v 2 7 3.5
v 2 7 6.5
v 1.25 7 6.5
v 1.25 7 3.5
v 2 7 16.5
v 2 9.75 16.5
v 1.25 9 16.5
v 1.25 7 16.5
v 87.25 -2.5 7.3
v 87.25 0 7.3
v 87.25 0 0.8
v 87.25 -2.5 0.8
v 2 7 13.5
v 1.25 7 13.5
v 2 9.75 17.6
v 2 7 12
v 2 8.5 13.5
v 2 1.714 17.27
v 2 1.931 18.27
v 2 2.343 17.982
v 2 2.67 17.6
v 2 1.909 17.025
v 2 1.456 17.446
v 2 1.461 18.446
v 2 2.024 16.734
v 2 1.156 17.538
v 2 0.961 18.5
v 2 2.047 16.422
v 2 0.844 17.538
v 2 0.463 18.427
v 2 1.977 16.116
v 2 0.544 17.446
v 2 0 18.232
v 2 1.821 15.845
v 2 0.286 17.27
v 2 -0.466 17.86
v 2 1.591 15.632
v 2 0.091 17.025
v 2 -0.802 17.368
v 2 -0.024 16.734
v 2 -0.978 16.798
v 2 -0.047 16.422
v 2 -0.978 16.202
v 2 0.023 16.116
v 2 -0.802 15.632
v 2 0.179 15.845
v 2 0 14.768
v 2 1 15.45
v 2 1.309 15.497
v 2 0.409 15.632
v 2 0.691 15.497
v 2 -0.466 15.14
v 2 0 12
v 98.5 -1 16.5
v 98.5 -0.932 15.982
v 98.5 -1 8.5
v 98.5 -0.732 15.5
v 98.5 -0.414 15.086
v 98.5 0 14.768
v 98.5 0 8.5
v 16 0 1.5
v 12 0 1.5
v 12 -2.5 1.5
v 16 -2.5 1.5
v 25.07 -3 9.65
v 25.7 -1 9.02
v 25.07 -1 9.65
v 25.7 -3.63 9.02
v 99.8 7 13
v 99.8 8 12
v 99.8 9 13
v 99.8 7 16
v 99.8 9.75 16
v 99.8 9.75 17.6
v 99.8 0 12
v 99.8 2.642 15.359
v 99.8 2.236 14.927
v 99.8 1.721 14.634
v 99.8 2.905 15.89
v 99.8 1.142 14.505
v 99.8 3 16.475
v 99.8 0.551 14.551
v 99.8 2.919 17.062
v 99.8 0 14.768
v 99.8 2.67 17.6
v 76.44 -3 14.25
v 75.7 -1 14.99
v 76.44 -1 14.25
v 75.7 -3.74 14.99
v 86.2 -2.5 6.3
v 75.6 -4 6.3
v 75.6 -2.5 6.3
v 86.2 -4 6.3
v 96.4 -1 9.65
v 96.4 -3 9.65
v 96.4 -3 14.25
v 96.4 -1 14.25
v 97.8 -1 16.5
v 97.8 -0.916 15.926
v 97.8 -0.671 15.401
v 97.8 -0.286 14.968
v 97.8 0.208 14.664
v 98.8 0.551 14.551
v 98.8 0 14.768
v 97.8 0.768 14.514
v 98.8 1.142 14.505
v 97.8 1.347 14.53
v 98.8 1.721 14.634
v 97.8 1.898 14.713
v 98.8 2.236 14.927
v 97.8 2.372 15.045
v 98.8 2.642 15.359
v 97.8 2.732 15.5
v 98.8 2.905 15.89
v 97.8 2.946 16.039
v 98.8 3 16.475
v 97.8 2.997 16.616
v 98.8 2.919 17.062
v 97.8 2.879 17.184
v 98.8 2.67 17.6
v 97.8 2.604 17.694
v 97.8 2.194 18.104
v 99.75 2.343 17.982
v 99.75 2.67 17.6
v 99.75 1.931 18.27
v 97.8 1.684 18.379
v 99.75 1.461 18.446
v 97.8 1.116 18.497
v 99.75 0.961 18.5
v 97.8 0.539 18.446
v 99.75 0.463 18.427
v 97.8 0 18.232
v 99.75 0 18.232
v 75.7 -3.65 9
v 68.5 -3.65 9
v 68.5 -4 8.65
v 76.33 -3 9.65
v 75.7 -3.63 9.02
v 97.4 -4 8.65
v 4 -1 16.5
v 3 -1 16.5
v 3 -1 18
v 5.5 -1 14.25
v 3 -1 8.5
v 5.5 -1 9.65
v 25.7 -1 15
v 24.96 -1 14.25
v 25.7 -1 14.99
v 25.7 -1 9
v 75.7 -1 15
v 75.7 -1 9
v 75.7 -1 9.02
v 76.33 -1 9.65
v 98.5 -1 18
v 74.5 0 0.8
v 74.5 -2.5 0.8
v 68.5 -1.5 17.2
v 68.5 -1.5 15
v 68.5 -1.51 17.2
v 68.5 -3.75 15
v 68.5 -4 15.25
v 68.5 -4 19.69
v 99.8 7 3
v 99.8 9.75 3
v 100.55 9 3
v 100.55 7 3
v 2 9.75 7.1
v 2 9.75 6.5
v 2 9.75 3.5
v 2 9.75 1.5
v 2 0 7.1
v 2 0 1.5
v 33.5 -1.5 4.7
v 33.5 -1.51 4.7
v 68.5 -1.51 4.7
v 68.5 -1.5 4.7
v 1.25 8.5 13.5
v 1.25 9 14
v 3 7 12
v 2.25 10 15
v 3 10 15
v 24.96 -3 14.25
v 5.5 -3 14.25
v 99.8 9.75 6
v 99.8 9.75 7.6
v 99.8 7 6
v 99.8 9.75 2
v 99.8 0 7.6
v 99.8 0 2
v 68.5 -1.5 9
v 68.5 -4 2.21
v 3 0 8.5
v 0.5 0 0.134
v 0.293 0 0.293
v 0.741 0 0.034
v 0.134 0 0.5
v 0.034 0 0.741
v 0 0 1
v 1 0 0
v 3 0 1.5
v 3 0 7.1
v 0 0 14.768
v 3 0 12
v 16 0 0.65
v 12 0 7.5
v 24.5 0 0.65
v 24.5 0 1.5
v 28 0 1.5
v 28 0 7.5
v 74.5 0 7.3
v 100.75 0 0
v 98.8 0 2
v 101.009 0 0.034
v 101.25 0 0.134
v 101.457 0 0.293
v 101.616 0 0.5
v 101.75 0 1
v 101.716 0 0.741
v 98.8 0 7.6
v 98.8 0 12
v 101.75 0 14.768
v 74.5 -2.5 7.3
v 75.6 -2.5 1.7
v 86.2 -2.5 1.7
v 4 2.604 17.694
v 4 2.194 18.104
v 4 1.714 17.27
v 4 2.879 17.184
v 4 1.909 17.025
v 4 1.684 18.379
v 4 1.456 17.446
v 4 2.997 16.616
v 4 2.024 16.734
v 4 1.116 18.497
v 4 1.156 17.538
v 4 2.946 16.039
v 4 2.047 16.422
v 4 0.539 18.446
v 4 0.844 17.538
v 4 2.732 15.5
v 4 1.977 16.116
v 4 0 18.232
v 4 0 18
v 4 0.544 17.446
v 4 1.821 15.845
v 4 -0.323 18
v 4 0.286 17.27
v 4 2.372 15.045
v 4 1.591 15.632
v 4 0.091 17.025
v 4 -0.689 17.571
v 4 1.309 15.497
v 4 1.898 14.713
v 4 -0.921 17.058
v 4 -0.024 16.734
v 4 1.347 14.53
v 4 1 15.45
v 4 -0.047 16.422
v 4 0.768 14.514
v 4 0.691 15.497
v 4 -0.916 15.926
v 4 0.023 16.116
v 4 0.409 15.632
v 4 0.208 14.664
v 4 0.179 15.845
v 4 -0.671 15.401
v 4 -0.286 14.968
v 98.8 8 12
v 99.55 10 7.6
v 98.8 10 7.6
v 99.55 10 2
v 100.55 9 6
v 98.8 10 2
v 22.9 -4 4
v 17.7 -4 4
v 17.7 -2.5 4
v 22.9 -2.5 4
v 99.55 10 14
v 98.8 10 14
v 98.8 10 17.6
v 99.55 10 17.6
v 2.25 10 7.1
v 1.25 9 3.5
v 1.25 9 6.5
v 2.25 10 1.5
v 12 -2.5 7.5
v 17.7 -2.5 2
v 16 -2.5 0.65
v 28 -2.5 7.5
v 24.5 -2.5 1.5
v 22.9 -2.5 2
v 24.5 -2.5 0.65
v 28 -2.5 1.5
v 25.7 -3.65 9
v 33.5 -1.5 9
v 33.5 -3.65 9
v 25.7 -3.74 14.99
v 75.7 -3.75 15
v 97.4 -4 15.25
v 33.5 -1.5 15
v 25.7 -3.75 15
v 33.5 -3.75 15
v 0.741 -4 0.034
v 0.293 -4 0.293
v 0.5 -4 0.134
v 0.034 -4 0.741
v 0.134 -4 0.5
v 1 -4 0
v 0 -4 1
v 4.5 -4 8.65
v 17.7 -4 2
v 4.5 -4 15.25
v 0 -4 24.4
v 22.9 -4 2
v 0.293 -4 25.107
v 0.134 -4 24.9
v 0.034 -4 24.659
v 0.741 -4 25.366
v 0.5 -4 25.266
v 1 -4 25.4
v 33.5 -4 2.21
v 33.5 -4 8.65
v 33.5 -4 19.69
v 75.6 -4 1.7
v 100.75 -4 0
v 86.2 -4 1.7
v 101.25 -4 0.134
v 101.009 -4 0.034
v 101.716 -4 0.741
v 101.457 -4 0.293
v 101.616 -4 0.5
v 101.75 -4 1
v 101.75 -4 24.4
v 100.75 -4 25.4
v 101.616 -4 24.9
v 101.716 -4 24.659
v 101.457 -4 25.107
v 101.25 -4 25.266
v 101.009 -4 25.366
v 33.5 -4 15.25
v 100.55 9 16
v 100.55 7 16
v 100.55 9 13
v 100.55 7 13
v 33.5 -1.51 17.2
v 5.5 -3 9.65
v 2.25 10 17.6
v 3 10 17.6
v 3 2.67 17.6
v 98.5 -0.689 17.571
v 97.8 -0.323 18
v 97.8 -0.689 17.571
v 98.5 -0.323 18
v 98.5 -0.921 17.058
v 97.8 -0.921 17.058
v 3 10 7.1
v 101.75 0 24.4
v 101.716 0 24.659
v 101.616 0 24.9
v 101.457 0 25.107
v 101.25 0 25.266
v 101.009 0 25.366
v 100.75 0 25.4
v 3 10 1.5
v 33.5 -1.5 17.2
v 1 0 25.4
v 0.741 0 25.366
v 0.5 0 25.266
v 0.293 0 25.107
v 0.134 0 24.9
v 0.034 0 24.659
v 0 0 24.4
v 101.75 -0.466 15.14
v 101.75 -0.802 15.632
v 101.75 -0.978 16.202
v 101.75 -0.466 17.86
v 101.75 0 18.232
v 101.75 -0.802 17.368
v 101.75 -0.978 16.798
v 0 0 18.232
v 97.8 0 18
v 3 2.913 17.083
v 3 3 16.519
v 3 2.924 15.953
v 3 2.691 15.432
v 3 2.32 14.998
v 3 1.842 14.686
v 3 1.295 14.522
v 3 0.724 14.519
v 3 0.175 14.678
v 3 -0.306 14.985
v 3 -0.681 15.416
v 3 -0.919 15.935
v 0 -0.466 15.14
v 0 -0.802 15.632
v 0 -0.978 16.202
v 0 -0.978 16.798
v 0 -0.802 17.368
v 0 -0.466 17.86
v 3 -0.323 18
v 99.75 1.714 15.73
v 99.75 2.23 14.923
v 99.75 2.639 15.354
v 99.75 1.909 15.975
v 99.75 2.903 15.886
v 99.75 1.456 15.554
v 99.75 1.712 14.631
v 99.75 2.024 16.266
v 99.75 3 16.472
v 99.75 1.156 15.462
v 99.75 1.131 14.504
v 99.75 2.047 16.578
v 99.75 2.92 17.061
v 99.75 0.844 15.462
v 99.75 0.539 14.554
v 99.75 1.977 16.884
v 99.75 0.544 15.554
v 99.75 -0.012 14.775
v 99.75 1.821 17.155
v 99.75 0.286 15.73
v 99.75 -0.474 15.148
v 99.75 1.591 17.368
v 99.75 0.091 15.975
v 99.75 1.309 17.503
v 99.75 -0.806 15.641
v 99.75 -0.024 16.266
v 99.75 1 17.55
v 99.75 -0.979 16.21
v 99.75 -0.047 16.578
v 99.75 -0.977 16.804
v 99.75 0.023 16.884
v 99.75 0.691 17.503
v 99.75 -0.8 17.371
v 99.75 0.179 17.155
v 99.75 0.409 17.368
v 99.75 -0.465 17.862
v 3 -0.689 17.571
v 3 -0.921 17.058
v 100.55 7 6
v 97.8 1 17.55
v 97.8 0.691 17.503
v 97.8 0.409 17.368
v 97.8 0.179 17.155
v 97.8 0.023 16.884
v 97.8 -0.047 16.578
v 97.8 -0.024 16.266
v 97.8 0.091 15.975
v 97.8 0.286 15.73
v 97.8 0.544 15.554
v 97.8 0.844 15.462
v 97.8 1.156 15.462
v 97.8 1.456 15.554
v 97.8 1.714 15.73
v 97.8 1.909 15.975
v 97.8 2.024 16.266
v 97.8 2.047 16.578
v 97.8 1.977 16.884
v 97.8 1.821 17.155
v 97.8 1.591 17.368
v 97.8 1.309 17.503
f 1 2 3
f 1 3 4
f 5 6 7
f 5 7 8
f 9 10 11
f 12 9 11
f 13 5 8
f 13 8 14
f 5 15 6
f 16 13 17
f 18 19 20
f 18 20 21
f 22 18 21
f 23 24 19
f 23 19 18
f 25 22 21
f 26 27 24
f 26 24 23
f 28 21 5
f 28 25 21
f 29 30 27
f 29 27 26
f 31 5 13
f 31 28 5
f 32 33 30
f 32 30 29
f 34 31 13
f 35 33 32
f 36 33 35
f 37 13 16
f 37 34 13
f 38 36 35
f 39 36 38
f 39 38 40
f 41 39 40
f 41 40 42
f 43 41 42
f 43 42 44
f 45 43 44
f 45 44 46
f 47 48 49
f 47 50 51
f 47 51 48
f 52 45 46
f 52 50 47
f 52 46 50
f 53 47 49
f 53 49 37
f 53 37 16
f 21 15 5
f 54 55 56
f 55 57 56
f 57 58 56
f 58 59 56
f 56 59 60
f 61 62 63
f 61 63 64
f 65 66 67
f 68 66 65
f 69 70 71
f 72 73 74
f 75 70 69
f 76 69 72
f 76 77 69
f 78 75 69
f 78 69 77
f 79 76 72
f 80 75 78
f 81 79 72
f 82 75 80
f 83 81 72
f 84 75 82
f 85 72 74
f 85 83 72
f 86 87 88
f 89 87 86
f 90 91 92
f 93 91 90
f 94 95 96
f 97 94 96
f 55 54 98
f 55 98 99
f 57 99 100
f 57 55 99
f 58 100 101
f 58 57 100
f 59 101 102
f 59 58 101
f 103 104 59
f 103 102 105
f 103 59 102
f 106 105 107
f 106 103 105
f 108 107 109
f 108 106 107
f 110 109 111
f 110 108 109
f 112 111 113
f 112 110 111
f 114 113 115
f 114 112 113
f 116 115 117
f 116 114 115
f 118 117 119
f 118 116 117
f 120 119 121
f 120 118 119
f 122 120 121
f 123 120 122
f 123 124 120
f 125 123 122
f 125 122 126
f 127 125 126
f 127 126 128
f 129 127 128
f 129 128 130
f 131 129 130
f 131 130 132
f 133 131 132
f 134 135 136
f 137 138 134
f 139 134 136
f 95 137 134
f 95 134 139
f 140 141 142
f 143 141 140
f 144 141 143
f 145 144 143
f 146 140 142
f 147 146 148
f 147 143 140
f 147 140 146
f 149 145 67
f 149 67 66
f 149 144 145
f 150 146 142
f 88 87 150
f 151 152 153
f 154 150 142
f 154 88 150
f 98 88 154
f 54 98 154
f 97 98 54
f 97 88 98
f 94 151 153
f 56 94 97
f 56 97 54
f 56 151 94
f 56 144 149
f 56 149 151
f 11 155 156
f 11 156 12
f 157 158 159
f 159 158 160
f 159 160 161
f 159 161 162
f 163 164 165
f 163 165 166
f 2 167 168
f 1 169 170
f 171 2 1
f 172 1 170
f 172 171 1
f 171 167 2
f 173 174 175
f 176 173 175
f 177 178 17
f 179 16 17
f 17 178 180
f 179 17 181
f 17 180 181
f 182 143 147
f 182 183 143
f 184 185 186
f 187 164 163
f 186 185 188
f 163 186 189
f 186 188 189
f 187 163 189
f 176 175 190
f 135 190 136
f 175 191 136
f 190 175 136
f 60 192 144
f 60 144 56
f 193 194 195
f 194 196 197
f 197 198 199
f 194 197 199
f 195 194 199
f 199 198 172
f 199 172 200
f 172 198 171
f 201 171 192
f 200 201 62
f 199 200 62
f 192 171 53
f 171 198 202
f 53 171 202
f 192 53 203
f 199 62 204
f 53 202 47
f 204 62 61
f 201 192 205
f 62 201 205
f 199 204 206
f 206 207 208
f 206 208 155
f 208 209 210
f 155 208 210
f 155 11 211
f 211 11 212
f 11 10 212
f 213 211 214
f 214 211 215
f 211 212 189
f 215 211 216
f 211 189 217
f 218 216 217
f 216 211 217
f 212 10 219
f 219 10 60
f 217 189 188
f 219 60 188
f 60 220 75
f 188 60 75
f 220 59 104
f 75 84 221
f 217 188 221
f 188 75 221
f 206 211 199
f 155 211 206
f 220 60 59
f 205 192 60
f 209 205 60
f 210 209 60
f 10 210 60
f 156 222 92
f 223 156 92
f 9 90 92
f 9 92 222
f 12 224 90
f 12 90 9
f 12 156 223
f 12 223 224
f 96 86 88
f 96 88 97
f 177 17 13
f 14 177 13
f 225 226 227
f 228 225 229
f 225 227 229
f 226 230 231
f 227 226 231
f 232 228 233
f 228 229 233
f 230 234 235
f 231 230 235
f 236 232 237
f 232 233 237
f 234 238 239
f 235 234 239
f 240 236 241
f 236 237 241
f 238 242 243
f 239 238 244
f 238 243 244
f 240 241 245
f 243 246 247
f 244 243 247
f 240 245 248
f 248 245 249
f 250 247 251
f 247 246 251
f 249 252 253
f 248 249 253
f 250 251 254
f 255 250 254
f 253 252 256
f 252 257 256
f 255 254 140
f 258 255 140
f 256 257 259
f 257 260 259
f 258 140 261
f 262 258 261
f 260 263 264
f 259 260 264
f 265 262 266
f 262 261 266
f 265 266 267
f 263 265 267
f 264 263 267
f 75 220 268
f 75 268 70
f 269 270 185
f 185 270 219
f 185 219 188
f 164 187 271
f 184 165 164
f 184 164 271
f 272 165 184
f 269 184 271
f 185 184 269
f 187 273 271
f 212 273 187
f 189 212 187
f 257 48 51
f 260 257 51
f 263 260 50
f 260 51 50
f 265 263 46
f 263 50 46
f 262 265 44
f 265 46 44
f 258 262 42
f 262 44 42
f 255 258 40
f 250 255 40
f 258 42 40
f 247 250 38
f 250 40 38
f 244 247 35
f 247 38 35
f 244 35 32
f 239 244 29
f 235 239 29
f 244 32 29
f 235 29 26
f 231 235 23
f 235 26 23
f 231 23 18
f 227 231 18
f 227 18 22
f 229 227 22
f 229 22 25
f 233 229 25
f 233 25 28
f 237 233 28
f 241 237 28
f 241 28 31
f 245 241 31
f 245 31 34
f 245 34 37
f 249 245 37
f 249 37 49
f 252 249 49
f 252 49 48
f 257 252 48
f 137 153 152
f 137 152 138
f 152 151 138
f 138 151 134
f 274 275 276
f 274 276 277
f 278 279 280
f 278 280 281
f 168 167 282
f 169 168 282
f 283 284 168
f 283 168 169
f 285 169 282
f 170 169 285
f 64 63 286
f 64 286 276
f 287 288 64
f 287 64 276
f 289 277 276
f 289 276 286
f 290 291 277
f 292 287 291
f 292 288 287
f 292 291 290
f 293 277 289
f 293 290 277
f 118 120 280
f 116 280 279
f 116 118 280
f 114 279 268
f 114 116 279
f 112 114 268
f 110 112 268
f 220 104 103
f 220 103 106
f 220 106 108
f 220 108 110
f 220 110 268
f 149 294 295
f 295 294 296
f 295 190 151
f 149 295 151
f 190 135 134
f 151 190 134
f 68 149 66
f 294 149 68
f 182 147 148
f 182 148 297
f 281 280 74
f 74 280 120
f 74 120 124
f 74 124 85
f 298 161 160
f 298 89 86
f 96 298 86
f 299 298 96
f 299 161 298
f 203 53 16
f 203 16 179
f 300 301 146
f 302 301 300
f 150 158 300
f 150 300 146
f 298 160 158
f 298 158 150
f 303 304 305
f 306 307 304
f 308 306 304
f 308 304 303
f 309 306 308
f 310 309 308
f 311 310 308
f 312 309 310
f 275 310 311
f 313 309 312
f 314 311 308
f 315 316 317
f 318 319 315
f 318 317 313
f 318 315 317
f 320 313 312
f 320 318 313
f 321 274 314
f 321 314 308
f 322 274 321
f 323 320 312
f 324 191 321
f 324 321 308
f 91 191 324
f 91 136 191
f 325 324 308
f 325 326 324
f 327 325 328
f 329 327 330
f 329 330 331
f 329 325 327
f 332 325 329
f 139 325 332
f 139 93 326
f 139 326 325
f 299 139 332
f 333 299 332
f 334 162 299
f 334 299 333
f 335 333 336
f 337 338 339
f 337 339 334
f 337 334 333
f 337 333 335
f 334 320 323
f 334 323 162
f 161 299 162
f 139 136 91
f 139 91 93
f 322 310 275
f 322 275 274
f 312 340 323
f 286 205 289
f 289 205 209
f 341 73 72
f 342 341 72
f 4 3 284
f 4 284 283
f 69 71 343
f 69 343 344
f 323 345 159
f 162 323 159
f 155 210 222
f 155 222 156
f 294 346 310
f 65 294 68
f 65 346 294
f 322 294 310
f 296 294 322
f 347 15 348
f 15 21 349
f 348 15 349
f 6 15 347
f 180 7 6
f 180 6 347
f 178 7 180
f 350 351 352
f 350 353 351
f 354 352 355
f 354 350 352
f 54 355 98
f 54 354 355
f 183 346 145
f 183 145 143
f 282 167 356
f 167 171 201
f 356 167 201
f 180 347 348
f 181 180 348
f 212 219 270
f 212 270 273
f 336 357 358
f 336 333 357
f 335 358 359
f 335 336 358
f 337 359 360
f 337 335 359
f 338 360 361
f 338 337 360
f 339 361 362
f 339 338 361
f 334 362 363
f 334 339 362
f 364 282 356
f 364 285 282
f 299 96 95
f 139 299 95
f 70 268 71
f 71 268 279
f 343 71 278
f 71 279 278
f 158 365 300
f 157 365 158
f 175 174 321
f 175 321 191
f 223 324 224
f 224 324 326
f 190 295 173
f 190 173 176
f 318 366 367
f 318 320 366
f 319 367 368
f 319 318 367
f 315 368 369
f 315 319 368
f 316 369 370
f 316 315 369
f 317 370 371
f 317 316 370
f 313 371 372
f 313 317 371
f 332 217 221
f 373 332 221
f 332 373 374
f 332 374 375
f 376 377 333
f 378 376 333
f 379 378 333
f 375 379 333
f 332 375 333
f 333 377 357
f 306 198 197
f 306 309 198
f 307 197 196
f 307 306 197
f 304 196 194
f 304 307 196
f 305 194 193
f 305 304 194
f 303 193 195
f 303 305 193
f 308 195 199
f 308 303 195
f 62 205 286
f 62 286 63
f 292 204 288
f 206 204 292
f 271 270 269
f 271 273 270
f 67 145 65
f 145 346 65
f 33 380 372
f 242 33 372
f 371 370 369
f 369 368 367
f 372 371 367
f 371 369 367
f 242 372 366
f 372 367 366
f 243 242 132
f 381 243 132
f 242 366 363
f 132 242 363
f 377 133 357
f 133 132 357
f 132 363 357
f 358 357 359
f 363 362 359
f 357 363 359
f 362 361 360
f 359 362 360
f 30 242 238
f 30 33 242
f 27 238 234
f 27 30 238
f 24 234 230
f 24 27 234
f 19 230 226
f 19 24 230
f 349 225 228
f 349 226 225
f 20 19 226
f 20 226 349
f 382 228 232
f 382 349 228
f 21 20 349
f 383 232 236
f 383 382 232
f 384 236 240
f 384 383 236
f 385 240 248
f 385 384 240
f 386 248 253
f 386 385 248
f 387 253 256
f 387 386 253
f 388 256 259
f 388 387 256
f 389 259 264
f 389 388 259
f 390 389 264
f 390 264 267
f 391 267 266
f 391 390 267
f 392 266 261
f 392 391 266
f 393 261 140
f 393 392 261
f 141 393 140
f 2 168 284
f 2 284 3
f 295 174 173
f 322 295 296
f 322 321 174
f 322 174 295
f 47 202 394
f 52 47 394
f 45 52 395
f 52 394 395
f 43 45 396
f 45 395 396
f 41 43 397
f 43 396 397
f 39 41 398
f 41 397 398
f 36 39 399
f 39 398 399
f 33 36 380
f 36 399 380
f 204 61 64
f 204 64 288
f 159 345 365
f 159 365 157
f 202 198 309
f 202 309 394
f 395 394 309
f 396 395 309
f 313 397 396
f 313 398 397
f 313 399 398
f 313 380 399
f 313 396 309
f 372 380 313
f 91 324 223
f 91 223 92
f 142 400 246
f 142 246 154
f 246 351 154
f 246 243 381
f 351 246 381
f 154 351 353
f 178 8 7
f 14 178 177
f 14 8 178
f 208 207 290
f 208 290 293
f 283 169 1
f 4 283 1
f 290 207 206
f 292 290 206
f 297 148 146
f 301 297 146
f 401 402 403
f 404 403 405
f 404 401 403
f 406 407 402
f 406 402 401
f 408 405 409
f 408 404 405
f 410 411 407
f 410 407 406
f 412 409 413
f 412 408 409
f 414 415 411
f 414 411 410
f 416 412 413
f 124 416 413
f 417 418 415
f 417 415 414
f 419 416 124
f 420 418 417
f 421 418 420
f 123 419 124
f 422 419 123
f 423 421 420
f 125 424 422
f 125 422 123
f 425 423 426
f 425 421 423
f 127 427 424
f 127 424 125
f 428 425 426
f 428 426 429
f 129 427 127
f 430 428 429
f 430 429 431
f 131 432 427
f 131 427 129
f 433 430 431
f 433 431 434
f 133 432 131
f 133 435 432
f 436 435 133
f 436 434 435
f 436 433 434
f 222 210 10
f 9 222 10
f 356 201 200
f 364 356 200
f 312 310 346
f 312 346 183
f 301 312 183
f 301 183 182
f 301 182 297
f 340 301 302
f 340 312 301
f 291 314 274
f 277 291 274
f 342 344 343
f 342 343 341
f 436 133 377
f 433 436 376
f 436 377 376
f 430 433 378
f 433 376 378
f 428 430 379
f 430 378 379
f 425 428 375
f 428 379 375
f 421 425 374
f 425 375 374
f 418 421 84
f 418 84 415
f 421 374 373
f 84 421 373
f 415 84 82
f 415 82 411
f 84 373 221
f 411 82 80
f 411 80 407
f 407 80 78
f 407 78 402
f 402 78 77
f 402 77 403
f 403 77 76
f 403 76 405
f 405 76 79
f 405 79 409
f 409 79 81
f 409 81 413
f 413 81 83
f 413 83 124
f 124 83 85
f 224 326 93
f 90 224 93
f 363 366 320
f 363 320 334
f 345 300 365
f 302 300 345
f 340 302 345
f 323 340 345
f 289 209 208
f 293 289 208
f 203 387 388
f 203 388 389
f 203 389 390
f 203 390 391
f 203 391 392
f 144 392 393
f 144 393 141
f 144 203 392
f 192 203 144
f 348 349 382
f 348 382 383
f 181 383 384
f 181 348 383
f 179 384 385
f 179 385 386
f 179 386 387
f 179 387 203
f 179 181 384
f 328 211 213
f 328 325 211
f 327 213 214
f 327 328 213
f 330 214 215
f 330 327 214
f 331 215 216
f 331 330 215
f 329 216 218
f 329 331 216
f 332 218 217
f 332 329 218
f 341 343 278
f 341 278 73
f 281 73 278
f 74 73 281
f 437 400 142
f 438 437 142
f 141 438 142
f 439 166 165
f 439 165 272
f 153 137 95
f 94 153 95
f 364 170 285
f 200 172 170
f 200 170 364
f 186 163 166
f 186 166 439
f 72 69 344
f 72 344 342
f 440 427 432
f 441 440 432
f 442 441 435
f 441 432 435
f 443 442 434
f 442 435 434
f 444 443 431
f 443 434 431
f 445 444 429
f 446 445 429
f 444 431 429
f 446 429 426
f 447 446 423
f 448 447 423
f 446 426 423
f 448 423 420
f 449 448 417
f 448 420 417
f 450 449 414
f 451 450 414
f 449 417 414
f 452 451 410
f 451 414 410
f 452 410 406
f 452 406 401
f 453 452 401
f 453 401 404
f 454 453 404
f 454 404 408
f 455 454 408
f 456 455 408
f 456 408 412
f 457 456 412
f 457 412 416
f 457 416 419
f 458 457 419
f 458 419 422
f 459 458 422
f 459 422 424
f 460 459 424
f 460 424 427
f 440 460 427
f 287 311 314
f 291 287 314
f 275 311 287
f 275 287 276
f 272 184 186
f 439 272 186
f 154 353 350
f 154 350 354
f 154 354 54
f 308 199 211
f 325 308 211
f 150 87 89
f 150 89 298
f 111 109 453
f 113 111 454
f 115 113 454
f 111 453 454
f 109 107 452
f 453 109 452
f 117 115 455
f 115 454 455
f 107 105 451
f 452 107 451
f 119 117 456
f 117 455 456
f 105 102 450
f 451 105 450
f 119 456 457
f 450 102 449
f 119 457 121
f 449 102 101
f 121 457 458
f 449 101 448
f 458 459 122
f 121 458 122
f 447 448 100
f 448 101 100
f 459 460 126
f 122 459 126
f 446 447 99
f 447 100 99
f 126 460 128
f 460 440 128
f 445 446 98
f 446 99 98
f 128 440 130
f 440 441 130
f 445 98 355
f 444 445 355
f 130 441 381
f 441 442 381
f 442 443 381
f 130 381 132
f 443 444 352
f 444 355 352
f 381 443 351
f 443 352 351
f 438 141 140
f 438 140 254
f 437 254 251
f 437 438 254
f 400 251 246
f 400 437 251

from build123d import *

# Parameters (mm, degrees)
SKETCH_W        = 101.75
SKETCH_H        = 25.4
PAD_DEPTH       = 4
FILLET_R        = 1
FILLET001_R     = 1
FILLET002_R     = 1
FILLET003_R     = 1
SKETCH001_W     = 90.9
SKETCH001_H     = 4.6
POCKET_DEPTH    = 5
CHAMFER_SIZE    = 1
CHAMFER001_SIZE = 1
CHAMFER002_SIZE = 1
CHAMFER003_SIZE = 1
SKETCH002_W     = 5.2
SKETCH002_H     = 2
POCKET001_DEPTH = 5
SKETCH003_W     = 50
SKETCH003_H     = 6
POCKET002_DEPTH = 5
SKETCH004_W     = 10.6
SKETCH004_H     = 4.6
POCKET003_DEPTH = 5
SKETCH005_W     = 35
SKETCH005_H     = 12.5
POCKET004_DEPTH = 2.5
CHAMFER004_SIZE = 2.49
CHAMFER005_SIZE = 0.74
CHAMFER006_SIZE = 0.63
CHAMFER007_SIZE = 0.63
CHAMFER008_SIZE = 0.74
CHAMFER009_SIZE = 2.49
SKETCH006_W     = 1
SKETCH006_H     = 5.6
PAD001_DEPTH    = 10
SKETCH007_W     = 3
SKETCH007_H     = 3
PAD002_DEPTH    = 0.75
CHAMFER010_SIZE = 1
SKETCH008_W     = 1
SKETCH008_H     = 5.6
PAD003_DEPTH    = 10
SKETCH009_W     = 3
SKETCH009_H     = 3
PAD004_DEPTH    = 0.75
CHAMFER011_SIZE = 3
CHAMFER012_SIZE = 1
SKETCH010_W     = 1
SKETCH010_H     = 5.6
PAD005_DEPTH    = 10
SKETCH011_W     = 3
SKETCH011_H     = 3
PAD006_DEPTH    = 0.75
CHAMFER013_SIZE = 1
SKETCH012_W     = 1
SKETCH012_H     = 5.6
PAD007_DEPTH    = 10
SKETCH013_W     = 3
SKETCH013_H     = 3
PAD008_DEPTH    = 0.75
CHAMFER014_SIZE = 2
CHAMFER015_SIZE = 1
SKETCH014_W     = 95.5
SKETCH014_H     = 9.5
POCKET005_DEPTH = 1
SKETCH015_R     = 2
PAD009_DEPTH    = 2
SKETCH016_R     = 1.05
POCKET006_DEPTH = 5
SKETCH017_R     = 2
PAD010_DEPTH    = 2
SKETCH018_R     = 1.05
POCKET007_DEPTH = 5
SKETCH019_R     = 2
POCKET008_DEPTH = 2
SKETCH020_R     = 2
POCKET009_DEPTH = 2
SKETCH022_W     = 8.5
SKETCH022_H     = 0.85
POCKET011_DEPTH = 2.5
SKETCH023_W     = 16
SKETCH023_H     = 6
POCKET012_DEPTH = 2.5
SKETCH024_W     = 12.75
SKETCH024_H     = 6.5
POCKET013_DEPTH = 2.5


with BuildPart() as part:
    # Sketch → Pad (new body)
    with BuildSketch(Plane.XZ):
        with Locations((50.875, 12.7)):
            Rectangle(SKETCH_W, SKETCH_H)
    extrude(amount=PAD_DEPTH)

    # Fillet
    fillet_edges = [part.edges().sort_by_distance(p)[0] for p in [
        (101.75, -2, 0),
    ]]
    fillet(fillet_edges, radius=FILLET_R)

    # Fillet001
    fillet001_edges = [part.edges().sort_by_distance(p)[0] for p in [
        (101.75, -2, 25.4),
    ]]
    fillet(fillet001_edges, radius=FILLET001_R)

    # Fillet002
    fillet002_edges = [part.edges().sort_by_distance(p)[0] for p in [
        (0, -2, 25.4),
    ]]
    fillet(fillet002_edges, radius=FILLET002_R)

    # Fillet003
    fillet003_edges = [part.edges().sort_by_distance(p)[0] for p in [
        (0, -2, 0),
    ]]
    fillet(fillet003_edges, radius=FILLET003_R)

    # Sketch001 (on Face10 of Fillet003) → Pocket (cut)
    with BuildSketch(Plane.XZ.offset(4)):
        with Locations((50.95, 11.95)):
            Rectangle(SKETCH001_W, SKETCH001_H)
    extrude(amount=-POCKET_DEPTH, mode=Mode.SUBTRACT)

    # Chamfer
    chamfer_edges = [part.edges().sort_by_distance(p)[0] for p in [
        (50.95, -4, 14.25),
    ]]
    chamfer(chamfer_edges, length=CHAMFER_SIZE)

    # Chamfer001
    chamfer001_edges = [part.edges().sort_by_distance(p)[0] for p in [
        (5.5, -4, 11.95),
    ]]
    chamfer(chamfer001_edges, length=CHAMFER001_SIZE)

    # Chamfer002
    chamfer002_edges = [part.edges().sort_by_distance(p)[0] for p in [
        (50.45, -4, 9.65),
    ]]
    chamfer(chamfer002_edges, length=CHAMFER002_SIZE)

    # Chamfer003
    chamfer003_edges = [part.edges().sort_by_distance(p)[0] for p in [
        (96.4, -4, 12.45),
    ]]
    chamfer(chamfer003_edges, length=CHAMFER003_SIZE)

    # Sketch002 (on Face6 of Chamfer003) → Pocket001 (cut)
    with BuildSketch(Plane.XZ.offset(4)):
        with Locations((20.3, 3)):
            Rectangle(SKETCH002_W, SKETCH002_H)
    extrude(amount=-POCKET001_DEPTH, mode=Mode.SUBTRACT)

    # Sketch003 (on Face7 of Pocket001) → Pocket002 (cut)
    with BuildSketch(Plane.XZ.offset(4)):
        with Locations((50.7, 12)):
            Rectangle(SKETCH003_W, SKETCH003_H)
    extrude(amount=-POCKET002_DEPTH, mode=Mode.SUBTRACT)

    # Sketch004 (on Face7 of Pocket002) → Pocket003 (cut)
    with BuildSketch(Plane.XZ.offset(4)):
        with Locations((80.9, 4)):
            Rectangle(SKETCH004_W, SKETCH004_H)
    extrude(amount=-POCKET003_DEPTH, mode=Mode.SUBTRACT)

    # Sketch005 (on Face7 of Pocket003) → Pocket004 (cut)
    with BuildSketch(Plane.XZ.offset(4)):
        with Locations((51, 10.95)):
            Rectangle(SKETCH005_W, SKETCH005_H)
    extrude(amount=-POCKET004_DEPTH, mode=Mode.SUBTRACT)

    # Chamfer004
    chamfer004_edges = [part.edges().sort_by_distance(p)[0] for p in [
        (51, -4, 4.7),
    ]]
    chamfer(chamfer004_edges, length=CHAMFER004_SIZE)

    # Chamfer005
    chamfer005_edges = [part.edges().sort_by_distance(p)[0] for p in [
        (25.7, -1.5, 14.25),
    ]]
    chamfer(chamfer005_edges, length=CHAMFER005_SIZE)

    # Chamfer006
    chamfer006_edges = [part.edges().sort_by_distance(p)[0] for p in [
        (25.7, -1.5, 9.65),
    ]]
    chamfer(chamfer006_edges, length=CHAMFER006_SIZE)

    # Chamfer007
    chamfer007_edges = [part.edges().sort_by_distance(p)[0] for p in [
        (75.7, -1.5, 9.65),
    ]]
    chamfer(chamfer007_edges, length=CHAMFER007_SIZE)

    # Chamfer008
    chamfer008_edges = [part.edges().sort_by_distance(p)[0] for p in [
        (75.7, -1.5, 14.25),
    ]]
    chamfer(chamfer008_edges, length=CHAMFER008_SIZE)

    # Chamfer009
    chamfer009_edges = [part.edges().sort_by_distance(p)[0] for p in [
        (51, -4, 17.2),
    ]]
    chamfer(chamfer009_edges, length=CHAMFER009_SIZE)

    # Sketch006 (on Face34 of Chamfer009) → Pad001 (join)
    with BuildSketch(Plane(origin=(0, 0, 0), x_dir=(1, 0, 0), z_dir=(0, 1, 0))):
        with Locations((2.5, -4.3)):
            Rectangle(SKETCH006_W, SKETCH006_H)
    extrude(amount=PAD001_DEPTH)

    # Sketch007 (on Face51 of Pad001) → Pad002 (join)
    with BuildSketch(Plane(origin=(2, 0, 0), x_dir=(0, 0, -1), z_dir=(-1, 0, 0))):
        with Locations((-5, -8.5)):
            Rectangle(SKETCH007_W, SKETCH007_H)
    extrude(amount=PAD002_DEPTH)

    # Chamfer010
    chamfer010_edges = [part.edges().sort_by_distance(p)[0] for p in [
        (1.25, 10, 5),
    ]]
    chamfer(chamfer010_edges, length=CHAMFER010_SIZE)

    # Sketch008 (on Face4 of Chamfer010) → Pad003 (join)
    with BuildSketch(Plane(origin=(0, 0, 0), x_dir=(1, 0, 0), z_dir=(0, 1, 0))):
        with Locations((2.5, -14.8)):
            Rectangle(SKETCH008_W, SKETCH008_H)
    extrude(amount=PAD003_DEPTH)

    # Sketch009 (on Face24 of Pad003) → Pad004 (join)
    with BuildSketch(Plane(origin=(2, 0, 0), x_dir=(0, 0, -1), z_dir=(-1, 0, 0))):
        with Locations((-15, -8.5)):
            Rectangle(SKETCH009_W, SKETCH009_H)
    extrude(amount=PAD004_DEPTH)

    # Chamfer011
    chamfer011_edges = [part.edges().sort_by_distance(p)[0] for p in [
        (2.5, 10, 12),
    ]]
    chamfer(chamfer011_edges, length=CHAMFER011_SIZE)

    # Chamfer012
    chamfer012_edges = [part.edges().sort_by_distance(p)[0] for p in [
        (1.25, 10, 15.75),
    ]]
    chamfer(chamfer012_edges, length=CHAMFER012_SIZE)

    # Sketch010 (on Face7 of Chamfer012) → Pad005 (join)
    with BuildSketch(Plane(origin=(0, 0, 0), x_dir=(1, 0, 0), z_dir=(0, 1, 0))):
        with Locations((99.3, -4.8)):
            Rectangle(SKETCH010_W, SKETCH010_H)
    extrude(amount=PAD005_DEPTH)

    # Sketch011 (on Face35 of Pad005) → Pad006 (join)
    with BuildSketch(Plane(origin=(99.8, 0, 0), x_dir=(0, 0, 1), z_dir=(1, 0, 0))):
        with Locations((4.5, -8.5)):
            Rectangle(SKETCH011_W, SKETCH011_H)
    extrude(amount=PAD006_DEPTH)

    # Chamfer013
    chamfer013_edges = [part.edges().sort_by_distance(p)[0] for p in [
        (100.55, 10, 4.5),
    ]]
    chamfer(chamfer013_edges, length=CHAMFER013_SIZE)

    # Sketch012 (on Face4 of Chamfer013) → Pad007 (join)
    with BuildSketch(Plane(origin=(0, 0, 0), x_dir=(1, 0, 0), z_dir=(0, 1, 0))):
        with Locations((99.3, -14.8)):
            Rectangle(SKETCH012_W, SKETCH012_H)
    extrude(amount=PAD007_DEPTH)

    # Sketch013 (on Face54 of Pad007) → Pad008 (join)
    with BuildSketch(Plane(origin=(99.8, 0, 0), x_dir=(0, 0, 1), z_dir=(1, 0, 0))):
        with Locations((14.5, -8.5)):
            Rectangle(SKETCH013_W, SKETCH013_H)
    extrude(amount=PAD008_DEPTH)

    # Chamfer014
    chamfer014_edges = [part.edges().sort_by_distance(p)[0] for p in [
        (99.3, 10, 12),
    ]]
    chamfer(chamfer014_edges, length=CHAMFER014_SIZE)

    # Chamfer015
    chamfer015_edges = [part.edges().sort_by_distance(p)[0] for p in [
        (100.55, 10, 15),
    ]]
    chamfer(chamfer015_edges, length=CHAMFER015_SIZE)

    # Sketch014 (on Face11 of Chamfer015) → Pocket005 (cut)
    with BuildSketch(Plane(origin=(0, 0, 0), x_dir=(1, 0, 0), z_dir=(0, 1, 0))):
        with Locations((50.75, -13.25)):
            Rectangle(SKETCH014_W, SKETCH014_H)
    extrude(amount=-POCKET005_DEPTH, mode=Mode.SUBTRACT)

    # Sketch015 (on Face7 of Pocket005) → Pad009 (join)
    with BuildSketch(Plane(origin=(99.8, 0, 0), x_dir=(0, 0, 1), z_dir=(1, 0, 0))):
        with Locations((16.5, -1)):
            Circle(SKETCH015_R)
    extrude(amount=-PAD009_DEPTH)

    # Sketch016 (on Face98 of Pad009) → Pocket006 (cut)
    with BuildSketch(Plane(origin=(99.8, 0, 0), x_dir=(0, 0, 1), z_dir=(1, 0, 0))):
        with Locations((16.5, -1)):
            Circle(SKETCH016_R)
    extrude(amount=-POCKET006_DEPTH, mode=Mode.SUBTRACT)

    # Sketch017 (on Face39 of Pocket006) → Pad010 (join)
    with BuildSketch(Plane(origin=(2, 0, 0), x_dir=(0, 0, -1), z_dir=(-1, 0, 0))):
        with Locations((-16.5, -1)):
            Circle(SKETCH017_R)
    extrude(amount=-PAD010_DEPTH)

    # Sketch018 (on Face103 of Pad010) → Pocket007 (cut)
    with BuildSketch(Plane(origin=(2, 0, 0), x_dir=(0, 0, -1), z_dir=(-1, 0, 0))):
        with Locations((-16.5, -1)):
            Circle(SKETCH018_R)
    extrude(amount=-POCKET007_DEPTH, mode=Mode.SUBTRACT)

    # Sketch019 (on Face18 of Pocket007) → Pocket008 (cut)
    with BuildSketch(Plane(origin=(0, 0, 0), x_dir=(0, 0, -1), z_dir=(-1, 0, 0))):
        with Locations((-16.5, -1)):
            Circle(SKETCH019_R)
    extrude(amount=-POCKET008_DEPTH, mode=Mode.SUBTRACT)

    # Sketch020 (on Face29 of Pocket008) → Pocket009 (cut)
    with BuildSketch(Plane(origin=(101.75, 0, 0), x_dir=(0, 0, 1), z_dir=(1, 0, 0))):
        with Locations((16.5, -1)):
            Circle(SKETCH020_R)
    extrude(amount=-POCKET009_DEPTH, mode=Mode.SUBTRACT)

    # Sketch022 → Pocket011 (cut)
    with BuildSketch(Plane(origin=(0, 0, 0), x_dir=(1, 0, 0), z_dir=(0, 1, 0))):
        with Locations((20.25, -1.075)):
            Rectangle(SKETCH022_W, SKETCH022_H)
    extrude(amount=-POCKET011_DEPTH, mode=Mode.SUBTRACT)

    # Sketch023 (on Face10 of Pocket011) → Pocket012 (cut)
    with BuildSketch(Plane(origin=(0, 0, 0), x_dir=(1, 0, 0), z_dir=(0, 1, 0))):
        with Locations((20, -4.5)):
            Rectangle(SKETCH023_W, SKETCH023_H)
    extrude(amount=-POCKET012_DEPTH, mode=Mode.SUBTRACT)

    # Sketch024 (on Face10 of Pocket012) → Pocket013 (cut)
    with BuildSketch(Plane(origin=(0, 0, 0), x_dir=(1, 0, 0), z_dir=(0, 1, 0))):
        with Locations((80.875, -4.05)):
            Rectangle(SKETCH024_W, SKETCH024_H)
    extrude(amount=-POCKET013_DEPTH, mode=Mode.SUBTRACT)


solid = part.part
